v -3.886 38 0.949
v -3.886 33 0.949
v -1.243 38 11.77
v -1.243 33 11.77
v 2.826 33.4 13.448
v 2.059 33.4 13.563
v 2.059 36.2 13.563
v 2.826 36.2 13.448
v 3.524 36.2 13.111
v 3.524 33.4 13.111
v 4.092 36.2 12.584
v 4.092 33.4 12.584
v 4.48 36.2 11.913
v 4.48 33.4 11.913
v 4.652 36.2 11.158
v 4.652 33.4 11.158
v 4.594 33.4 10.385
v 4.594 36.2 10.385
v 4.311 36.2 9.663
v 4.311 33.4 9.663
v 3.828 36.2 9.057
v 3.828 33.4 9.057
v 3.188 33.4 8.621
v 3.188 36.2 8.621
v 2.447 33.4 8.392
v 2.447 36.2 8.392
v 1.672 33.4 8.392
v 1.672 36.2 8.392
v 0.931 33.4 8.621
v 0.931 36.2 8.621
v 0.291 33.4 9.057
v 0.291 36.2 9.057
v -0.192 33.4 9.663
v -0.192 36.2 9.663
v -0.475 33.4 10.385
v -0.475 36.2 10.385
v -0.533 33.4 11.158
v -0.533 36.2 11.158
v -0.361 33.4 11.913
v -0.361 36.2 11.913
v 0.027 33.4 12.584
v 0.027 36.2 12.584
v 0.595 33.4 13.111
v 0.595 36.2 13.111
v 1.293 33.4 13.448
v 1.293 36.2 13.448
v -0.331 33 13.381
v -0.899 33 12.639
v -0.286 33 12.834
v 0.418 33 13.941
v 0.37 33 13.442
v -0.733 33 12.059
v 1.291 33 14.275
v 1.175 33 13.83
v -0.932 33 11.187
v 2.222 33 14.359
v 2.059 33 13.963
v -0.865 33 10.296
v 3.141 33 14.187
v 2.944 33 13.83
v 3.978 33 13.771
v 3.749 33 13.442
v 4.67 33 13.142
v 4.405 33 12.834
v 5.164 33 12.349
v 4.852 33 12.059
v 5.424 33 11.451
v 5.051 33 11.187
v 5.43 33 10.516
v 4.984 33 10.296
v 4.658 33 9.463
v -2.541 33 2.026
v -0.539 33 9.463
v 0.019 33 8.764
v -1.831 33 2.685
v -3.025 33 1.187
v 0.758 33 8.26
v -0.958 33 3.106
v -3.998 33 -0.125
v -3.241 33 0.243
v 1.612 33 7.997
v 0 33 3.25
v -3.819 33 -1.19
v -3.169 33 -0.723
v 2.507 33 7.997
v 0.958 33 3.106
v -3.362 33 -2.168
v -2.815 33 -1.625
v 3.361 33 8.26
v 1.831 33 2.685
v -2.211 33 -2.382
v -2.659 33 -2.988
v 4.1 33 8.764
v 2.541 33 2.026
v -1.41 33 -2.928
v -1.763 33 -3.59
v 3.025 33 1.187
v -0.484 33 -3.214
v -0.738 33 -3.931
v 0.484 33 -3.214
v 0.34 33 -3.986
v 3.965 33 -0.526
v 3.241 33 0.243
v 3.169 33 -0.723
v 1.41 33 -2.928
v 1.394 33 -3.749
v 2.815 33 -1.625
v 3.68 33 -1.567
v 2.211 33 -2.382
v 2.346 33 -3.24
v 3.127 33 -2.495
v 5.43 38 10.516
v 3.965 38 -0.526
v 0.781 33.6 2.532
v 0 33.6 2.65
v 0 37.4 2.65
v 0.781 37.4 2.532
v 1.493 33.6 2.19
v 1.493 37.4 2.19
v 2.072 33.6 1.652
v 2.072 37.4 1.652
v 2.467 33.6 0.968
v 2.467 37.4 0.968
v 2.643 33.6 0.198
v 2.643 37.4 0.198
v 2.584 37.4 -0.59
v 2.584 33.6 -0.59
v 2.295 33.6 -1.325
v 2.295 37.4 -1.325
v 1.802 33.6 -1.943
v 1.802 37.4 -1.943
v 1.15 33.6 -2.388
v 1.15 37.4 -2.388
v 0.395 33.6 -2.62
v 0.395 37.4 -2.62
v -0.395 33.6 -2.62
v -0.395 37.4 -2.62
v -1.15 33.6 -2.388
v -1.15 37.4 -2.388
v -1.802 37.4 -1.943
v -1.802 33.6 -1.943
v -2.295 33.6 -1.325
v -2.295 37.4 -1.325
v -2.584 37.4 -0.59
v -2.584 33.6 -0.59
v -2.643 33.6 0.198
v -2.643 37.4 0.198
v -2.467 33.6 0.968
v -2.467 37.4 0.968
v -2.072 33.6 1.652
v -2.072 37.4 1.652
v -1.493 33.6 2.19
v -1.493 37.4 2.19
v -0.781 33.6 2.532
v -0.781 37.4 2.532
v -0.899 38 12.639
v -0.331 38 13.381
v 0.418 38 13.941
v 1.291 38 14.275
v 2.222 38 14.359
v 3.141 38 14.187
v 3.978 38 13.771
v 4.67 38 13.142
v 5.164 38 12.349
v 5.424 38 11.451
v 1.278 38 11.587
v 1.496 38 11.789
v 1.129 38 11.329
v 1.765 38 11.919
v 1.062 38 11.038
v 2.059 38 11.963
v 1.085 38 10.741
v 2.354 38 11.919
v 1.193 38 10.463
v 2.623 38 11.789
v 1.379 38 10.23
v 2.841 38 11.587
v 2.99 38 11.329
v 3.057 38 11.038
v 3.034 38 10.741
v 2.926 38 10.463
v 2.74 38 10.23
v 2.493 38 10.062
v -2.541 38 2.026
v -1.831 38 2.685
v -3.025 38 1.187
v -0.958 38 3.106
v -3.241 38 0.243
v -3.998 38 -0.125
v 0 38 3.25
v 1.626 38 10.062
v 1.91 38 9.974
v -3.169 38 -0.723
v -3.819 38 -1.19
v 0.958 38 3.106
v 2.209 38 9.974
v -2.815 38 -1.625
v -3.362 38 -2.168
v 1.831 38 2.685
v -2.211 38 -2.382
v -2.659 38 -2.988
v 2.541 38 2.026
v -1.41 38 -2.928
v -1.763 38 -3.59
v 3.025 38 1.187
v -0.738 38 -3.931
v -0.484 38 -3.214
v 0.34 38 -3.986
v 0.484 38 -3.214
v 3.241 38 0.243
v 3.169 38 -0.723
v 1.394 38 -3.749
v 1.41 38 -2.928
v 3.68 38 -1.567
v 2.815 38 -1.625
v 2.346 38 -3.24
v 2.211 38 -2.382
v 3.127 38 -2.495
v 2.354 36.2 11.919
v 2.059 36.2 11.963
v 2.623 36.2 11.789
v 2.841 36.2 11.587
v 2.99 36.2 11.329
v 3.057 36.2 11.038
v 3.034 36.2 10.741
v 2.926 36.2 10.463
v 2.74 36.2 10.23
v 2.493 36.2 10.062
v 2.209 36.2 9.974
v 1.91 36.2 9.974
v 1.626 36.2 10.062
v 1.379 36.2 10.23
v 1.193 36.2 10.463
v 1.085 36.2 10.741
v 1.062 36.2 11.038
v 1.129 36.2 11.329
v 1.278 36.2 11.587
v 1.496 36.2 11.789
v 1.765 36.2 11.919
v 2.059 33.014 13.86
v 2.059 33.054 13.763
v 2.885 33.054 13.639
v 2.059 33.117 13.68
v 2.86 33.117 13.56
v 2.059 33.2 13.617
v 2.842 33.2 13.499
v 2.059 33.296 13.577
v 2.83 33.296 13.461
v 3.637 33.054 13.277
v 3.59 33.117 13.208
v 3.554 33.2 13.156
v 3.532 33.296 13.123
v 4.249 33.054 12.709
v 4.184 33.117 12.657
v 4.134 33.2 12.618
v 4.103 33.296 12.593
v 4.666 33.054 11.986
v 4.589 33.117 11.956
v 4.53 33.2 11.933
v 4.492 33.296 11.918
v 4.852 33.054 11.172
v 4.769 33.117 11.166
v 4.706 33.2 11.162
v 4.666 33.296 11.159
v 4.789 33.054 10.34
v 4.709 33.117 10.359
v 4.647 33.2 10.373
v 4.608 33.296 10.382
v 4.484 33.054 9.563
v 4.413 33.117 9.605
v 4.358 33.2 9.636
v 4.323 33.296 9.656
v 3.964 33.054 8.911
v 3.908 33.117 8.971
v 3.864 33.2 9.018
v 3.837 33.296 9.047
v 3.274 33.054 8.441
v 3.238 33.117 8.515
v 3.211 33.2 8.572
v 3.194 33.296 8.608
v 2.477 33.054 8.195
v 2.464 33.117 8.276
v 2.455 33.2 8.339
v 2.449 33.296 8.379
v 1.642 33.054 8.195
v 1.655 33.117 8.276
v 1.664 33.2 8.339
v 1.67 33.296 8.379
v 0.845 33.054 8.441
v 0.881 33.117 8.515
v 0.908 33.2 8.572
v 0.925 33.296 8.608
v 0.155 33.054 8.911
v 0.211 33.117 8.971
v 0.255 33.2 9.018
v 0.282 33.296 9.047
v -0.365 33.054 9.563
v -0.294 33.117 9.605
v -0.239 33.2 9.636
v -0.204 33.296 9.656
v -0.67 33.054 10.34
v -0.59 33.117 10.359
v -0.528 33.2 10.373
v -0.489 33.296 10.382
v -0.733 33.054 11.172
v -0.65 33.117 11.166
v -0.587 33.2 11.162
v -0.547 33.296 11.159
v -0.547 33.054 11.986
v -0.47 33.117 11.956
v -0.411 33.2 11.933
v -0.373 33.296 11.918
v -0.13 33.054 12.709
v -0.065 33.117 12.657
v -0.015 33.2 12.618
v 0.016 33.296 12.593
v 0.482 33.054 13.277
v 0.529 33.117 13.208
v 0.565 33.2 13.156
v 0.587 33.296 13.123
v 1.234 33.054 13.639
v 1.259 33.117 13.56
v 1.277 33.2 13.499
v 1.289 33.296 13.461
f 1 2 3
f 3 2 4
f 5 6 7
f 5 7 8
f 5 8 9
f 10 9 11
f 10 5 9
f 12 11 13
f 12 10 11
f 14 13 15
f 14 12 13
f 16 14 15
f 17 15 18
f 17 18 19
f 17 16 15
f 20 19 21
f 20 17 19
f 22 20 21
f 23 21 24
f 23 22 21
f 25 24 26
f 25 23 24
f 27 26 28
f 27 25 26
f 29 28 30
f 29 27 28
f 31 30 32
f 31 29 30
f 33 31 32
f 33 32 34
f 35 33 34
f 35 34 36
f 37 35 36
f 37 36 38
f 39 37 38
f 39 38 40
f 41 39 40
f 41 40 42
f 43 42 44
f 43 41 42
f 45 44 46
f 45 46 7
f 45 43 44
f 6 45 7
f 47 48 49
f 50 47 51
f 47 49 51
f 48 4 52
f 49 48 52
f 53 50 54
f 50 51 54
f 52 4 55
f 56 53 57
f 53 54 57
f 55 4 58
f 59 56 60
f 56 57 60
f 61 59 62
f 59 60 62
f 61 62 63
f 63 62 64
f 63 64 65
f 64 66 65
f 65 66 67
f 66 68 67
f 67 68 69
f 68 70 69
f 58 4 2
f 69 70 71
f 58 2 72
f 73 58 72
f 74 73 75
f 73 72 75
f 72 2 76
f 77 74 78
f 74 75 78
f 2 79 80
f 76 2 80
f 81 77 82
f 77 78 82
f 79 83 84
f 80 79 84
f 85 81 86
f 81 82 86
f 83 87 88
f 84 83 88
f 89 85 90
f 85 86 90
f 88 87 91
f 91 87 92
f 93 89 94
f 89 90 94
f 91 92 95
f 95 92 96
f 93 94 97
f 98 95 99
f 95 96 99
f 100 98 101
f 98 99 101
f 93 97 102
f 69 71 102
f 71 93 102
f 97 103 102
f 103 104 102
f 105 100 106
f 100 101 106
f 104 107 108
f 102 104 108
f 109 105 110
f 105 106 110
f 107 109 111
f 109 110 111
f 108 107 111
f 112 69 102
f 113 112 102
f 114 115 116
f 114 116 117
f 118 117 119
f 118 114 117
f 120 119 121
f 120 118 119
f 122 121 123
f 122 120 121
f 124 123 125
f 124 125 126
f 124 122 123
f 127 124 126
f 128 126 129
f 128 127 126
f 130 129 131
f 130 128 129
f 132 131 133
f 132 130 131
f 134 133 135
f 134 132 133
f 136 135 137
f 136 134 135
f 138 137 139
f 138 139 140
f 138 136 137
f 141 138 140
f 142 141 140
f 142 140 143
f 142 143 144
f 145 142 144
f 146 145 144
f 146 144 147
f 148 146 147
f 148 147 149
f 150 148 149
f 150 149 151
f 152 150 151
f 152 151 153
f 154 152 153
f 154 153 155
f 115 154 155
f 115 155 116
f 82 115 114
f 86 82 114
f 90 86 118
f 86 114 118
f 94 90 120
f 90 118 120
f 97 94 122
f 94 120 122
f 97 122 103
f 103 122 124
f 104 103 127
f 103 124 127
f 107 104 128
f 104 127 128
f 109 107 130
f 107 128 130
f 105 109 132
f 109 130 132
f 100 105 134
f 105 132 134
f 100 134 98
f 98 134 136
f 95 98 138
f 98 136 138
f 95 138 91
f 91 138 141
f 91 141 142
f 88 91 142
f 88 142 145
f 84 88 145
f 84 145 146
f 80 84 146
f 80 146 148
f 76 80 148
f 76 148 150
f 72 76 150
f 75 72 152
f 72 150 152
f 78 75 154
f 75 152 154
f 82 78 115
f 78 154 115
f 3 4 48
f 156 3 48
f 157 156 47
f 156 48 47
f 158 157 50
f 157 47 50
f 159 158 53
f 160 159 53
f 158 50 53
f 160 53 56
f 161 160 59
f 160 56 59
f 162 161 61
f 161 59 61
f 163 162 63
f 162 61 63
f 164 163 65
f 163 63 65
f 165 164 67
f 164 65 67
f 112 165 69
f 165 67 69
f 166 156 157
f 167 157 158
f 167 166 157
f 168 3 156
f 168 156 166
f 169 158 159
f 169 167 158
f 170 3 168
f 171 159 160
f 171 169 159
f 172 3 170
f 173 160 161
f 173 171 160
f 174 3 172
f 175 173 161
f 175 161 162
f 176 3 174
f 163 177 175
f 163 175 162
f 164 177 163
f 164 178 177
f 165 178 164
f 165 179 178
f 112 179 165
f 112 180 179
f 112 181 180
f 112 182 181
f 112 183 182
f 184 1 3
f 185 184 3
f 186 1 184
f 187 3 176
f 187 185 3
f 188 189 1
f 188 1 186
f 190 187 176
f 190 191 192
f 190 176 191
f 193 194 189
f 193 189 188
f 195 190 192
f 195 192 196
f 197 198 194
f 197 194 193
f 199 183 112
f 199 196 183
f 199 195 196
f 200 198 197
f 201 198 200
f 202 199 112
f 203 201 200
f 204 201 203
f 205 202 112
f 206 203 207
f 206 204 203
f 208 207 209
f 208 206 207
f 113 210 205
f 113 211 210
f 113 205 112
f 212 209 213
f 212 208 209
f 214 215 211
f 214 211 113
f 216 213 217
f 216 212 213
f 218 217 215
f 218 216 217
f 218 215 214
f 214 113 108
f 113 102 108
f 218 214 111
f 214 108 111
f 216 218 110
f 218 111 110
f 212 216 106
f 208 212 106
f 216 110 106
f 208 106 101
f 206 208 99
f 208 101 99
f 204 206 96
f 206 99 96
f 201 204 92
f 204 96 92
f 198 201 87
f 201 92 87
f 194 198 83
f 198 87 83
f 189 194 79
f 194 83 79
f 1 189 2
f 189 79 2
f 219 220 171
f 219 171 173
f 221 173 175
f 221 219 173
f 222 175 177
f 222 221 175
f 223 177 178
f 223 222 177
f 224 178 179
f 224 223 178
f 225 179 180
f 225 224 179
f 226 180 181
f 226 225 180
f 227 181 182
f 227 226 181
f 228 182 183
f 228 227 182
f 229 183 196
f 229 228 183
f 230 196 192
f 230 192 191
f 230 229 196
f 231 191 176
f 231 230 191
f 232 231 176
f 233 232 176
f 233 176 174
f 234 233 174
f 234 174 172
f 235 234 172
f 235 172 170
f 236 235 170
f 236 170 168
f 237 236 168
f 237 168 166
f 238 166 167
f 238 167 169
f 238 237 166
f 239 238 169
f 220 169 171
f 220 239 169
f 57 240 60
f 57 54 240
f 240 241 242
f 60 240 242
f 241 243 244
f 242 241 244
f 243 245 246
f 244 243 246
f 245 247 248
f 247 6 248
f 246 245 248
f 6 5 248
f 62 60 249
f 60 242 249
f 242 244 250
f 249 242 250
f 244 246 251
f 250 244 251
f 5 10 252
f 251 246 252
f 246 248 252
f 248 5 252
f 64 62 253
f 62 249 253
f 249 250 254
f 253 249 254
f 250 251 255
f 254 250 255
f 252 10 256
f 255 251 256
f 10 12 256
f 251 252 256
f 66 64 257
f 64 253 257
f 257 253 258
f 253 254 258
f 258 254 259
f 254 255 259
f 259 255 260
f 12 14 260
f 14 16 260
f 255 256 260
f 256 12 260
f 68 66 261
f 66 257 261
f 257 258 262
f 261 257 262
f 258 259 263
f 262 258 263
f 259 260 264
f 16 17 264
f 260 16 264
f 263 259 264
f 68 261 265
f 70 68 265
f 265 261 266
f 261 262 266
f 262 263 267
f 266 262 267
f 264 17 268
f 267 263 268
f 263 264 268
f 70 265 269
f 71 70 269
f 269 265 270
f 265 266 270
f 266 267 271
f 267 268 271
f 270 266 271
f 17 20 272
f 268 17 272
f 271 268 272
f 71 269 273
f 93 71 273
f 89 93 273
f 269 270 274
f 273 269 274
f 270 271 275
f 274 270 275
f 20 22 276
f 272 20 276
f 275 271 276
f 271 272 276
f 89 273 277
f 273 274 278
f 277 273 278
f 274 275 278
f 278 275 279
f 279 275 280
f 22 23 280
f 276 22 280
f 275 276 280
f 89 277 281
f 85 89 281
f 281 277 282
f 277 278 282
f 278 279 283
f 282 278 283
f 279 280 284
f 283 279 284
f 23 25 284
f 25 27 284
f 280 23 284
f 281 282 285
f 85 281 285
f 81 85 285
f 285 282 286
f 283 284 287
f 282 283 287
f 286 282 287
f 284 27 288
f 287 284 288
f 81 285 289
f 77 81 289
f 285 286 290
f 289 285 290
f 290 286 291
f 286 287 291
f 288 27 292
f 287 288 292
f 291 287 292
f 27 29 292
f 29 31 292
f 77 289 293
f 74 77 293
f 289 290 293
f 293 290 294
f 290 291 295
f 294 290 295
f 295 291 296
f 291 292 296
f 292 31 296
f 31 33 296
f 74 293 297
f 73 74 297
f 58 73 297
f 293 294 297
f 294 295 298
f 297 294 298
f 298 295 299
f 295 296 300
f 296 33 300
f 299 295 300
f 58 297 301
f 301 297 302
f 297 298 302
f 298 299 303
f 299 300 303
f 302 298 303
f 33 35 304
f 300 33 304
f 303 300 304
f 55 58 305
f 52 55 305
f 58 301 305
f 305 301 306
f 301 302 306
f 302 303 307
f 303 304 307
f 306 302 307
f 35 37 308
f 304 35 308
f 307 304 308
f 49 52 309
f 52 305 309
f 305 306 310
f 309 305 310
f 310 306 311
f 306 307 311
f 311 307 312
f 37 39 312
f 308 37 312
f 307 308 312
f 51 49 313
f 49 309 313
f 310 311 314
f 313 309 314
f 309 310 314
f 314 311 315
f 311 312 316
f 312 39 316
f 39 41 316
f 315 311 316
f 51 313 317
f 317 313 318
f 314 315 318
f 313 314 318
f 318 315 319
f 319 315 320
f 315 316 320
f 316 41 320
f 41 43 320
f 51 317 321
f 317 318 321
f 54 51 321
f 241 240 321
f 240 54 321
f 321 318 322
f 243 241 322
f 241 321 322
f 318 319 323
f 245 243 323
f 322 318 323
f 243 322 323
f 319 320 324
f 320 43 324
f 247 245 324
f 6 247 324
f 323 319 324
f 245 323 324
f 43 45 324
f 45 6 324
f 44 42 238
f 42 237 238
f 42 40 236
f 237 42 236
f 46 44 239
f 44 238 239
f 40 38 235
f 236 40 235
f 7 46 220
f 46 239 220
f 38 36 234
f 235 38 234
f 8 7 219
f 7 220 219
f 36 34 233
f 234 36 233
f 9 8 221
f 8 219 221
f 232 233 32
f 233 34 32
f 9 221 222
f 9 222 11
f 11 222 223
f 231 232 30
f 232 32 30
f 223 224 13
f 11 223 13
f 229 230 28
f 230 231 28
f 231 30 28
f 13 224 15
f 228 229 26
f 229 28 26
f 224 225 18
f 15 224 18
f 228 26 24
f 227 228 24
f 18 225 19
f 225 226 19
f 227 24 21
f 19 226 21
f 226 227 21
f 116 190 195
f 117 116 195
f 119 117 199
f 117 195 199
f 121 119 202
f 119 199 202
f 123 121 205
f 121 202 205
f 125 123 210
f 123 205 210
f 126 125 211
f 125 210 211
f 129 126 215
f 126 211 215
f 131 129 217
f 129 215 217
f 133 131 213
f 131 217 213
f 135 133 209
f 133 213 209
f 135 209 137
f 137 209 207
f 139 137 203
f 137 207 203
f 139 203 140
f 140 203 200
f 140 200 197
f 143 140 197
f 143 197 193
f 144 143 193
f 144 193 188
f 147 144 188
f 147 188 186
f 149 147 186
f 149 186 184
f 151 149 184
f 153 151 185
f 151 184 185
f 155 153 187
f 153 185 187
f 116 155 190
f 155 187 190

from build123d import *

# Parameters (mm, degrees)
SKETCH1_R           = 2.6
SKETCH1_R_2         = 2.65
BOSS_EXTRUDE1_DEPTH = 3.2
BOSS_EXTRUDE2_START = 3.2
SKETCH1_3_R         = 2.65
SKETCH1_3_R_2       = 1
BOSS_EXTRUDE2_DEPTH = 1.8
CHAMFER1_SIZE       = 0.6
FILLET3_R           = 0.4


with BuildPart() as part:
    # Sketch1 → Boss-Extrude1 (new body)
    with BuildSketch(Plane(origin=(0, 33, 0), x_dir=(1, 0, 0), z_dir=(0, 1, 0))):
        with BuildLine():
            Line((5.429968705, -10.516152569), (3.965267434, 0.525979253))
            ThreePointArc((3.965267434, 0.525979253), (-0.738499825, 3.931236194), (-3.885823258, -0.948882295))
            Line((-3.885823258, -0.948882295), (-1.243458383, -11.769784885))
            ThreePointArc((-1.243458383, -11.769784885), (2.687216237, -14.304785699), (5.429968705, -10.516152569))
        make_face()
        with Locations(Location((2.059491386, -10.963234935, 0), (0, 0, 270))):
            Circle(SKETCH1_R, mode=Mode.SUBTRACT)
        with Locations(Location((0, 0, 0), (0, 0, 270))):
            Circle(SKETCH1_R_2, mode=Mode.SUBTRACT)
    extrude(amount=BOSS_EXTRUDE1_DEPTH)

    # Sketch1<3> → Boss-Extrude2 (add)
    with BuildSketch(Plane(origin=(0, 33, 0), x_dir=(1, 0, 0), z_dir=(0, 1, 0)).offset(BOSS_EXTRUDE2_START)):
        with BuildLine():
            Line((5.429968705, -10.516152569), (3.965267434, 0.525979253))
            ThreePointArc((3.965267434, 0.525979253), (-0.738499825, 3.931236194), (-3.885823258, -0.948882295))
            Line((-3.885823258, -0.948882295), (-1.243458383, -11.769784885))
            ThreePointArc((-1.243458383, -11.769784885), (2.687216237, -14.304785699), (5.429968705, -10.516152569))
        make_face()
        with Locations(Location((0, 0, 0), (0, 0, 270))):
            Circle(SKETCH1_3_R, mode=Mode.SUBTRACT)
        with Locations(Location((2.059491386, -10.963234935, 0), (0, 0, 270))):
            Circle(SKETCH1_3_R_2, mode=Mode.SUBTRACT)
    extrude(amount=BOSS_EXTRUDE2_DEPTH)

    # Chamfer1
    chamfer1_edges = [part.edges().sort_by_distance(p)[0] for p in [
        (0, 33, -2.65),
        (0, 38, -2.65),
    ]]
    chamfer(chamfer1_edges, length=CHAMFER1_SIZE)

    # Fillet3
    fillet3_edges = [part.edges().sort_by_distance(p)[0] for p in [
        (2.059491386, 33, 8.363234935),
    ]]
    fillet(fillet3_edges, radius=FILLET3_R)


solid = part.part
